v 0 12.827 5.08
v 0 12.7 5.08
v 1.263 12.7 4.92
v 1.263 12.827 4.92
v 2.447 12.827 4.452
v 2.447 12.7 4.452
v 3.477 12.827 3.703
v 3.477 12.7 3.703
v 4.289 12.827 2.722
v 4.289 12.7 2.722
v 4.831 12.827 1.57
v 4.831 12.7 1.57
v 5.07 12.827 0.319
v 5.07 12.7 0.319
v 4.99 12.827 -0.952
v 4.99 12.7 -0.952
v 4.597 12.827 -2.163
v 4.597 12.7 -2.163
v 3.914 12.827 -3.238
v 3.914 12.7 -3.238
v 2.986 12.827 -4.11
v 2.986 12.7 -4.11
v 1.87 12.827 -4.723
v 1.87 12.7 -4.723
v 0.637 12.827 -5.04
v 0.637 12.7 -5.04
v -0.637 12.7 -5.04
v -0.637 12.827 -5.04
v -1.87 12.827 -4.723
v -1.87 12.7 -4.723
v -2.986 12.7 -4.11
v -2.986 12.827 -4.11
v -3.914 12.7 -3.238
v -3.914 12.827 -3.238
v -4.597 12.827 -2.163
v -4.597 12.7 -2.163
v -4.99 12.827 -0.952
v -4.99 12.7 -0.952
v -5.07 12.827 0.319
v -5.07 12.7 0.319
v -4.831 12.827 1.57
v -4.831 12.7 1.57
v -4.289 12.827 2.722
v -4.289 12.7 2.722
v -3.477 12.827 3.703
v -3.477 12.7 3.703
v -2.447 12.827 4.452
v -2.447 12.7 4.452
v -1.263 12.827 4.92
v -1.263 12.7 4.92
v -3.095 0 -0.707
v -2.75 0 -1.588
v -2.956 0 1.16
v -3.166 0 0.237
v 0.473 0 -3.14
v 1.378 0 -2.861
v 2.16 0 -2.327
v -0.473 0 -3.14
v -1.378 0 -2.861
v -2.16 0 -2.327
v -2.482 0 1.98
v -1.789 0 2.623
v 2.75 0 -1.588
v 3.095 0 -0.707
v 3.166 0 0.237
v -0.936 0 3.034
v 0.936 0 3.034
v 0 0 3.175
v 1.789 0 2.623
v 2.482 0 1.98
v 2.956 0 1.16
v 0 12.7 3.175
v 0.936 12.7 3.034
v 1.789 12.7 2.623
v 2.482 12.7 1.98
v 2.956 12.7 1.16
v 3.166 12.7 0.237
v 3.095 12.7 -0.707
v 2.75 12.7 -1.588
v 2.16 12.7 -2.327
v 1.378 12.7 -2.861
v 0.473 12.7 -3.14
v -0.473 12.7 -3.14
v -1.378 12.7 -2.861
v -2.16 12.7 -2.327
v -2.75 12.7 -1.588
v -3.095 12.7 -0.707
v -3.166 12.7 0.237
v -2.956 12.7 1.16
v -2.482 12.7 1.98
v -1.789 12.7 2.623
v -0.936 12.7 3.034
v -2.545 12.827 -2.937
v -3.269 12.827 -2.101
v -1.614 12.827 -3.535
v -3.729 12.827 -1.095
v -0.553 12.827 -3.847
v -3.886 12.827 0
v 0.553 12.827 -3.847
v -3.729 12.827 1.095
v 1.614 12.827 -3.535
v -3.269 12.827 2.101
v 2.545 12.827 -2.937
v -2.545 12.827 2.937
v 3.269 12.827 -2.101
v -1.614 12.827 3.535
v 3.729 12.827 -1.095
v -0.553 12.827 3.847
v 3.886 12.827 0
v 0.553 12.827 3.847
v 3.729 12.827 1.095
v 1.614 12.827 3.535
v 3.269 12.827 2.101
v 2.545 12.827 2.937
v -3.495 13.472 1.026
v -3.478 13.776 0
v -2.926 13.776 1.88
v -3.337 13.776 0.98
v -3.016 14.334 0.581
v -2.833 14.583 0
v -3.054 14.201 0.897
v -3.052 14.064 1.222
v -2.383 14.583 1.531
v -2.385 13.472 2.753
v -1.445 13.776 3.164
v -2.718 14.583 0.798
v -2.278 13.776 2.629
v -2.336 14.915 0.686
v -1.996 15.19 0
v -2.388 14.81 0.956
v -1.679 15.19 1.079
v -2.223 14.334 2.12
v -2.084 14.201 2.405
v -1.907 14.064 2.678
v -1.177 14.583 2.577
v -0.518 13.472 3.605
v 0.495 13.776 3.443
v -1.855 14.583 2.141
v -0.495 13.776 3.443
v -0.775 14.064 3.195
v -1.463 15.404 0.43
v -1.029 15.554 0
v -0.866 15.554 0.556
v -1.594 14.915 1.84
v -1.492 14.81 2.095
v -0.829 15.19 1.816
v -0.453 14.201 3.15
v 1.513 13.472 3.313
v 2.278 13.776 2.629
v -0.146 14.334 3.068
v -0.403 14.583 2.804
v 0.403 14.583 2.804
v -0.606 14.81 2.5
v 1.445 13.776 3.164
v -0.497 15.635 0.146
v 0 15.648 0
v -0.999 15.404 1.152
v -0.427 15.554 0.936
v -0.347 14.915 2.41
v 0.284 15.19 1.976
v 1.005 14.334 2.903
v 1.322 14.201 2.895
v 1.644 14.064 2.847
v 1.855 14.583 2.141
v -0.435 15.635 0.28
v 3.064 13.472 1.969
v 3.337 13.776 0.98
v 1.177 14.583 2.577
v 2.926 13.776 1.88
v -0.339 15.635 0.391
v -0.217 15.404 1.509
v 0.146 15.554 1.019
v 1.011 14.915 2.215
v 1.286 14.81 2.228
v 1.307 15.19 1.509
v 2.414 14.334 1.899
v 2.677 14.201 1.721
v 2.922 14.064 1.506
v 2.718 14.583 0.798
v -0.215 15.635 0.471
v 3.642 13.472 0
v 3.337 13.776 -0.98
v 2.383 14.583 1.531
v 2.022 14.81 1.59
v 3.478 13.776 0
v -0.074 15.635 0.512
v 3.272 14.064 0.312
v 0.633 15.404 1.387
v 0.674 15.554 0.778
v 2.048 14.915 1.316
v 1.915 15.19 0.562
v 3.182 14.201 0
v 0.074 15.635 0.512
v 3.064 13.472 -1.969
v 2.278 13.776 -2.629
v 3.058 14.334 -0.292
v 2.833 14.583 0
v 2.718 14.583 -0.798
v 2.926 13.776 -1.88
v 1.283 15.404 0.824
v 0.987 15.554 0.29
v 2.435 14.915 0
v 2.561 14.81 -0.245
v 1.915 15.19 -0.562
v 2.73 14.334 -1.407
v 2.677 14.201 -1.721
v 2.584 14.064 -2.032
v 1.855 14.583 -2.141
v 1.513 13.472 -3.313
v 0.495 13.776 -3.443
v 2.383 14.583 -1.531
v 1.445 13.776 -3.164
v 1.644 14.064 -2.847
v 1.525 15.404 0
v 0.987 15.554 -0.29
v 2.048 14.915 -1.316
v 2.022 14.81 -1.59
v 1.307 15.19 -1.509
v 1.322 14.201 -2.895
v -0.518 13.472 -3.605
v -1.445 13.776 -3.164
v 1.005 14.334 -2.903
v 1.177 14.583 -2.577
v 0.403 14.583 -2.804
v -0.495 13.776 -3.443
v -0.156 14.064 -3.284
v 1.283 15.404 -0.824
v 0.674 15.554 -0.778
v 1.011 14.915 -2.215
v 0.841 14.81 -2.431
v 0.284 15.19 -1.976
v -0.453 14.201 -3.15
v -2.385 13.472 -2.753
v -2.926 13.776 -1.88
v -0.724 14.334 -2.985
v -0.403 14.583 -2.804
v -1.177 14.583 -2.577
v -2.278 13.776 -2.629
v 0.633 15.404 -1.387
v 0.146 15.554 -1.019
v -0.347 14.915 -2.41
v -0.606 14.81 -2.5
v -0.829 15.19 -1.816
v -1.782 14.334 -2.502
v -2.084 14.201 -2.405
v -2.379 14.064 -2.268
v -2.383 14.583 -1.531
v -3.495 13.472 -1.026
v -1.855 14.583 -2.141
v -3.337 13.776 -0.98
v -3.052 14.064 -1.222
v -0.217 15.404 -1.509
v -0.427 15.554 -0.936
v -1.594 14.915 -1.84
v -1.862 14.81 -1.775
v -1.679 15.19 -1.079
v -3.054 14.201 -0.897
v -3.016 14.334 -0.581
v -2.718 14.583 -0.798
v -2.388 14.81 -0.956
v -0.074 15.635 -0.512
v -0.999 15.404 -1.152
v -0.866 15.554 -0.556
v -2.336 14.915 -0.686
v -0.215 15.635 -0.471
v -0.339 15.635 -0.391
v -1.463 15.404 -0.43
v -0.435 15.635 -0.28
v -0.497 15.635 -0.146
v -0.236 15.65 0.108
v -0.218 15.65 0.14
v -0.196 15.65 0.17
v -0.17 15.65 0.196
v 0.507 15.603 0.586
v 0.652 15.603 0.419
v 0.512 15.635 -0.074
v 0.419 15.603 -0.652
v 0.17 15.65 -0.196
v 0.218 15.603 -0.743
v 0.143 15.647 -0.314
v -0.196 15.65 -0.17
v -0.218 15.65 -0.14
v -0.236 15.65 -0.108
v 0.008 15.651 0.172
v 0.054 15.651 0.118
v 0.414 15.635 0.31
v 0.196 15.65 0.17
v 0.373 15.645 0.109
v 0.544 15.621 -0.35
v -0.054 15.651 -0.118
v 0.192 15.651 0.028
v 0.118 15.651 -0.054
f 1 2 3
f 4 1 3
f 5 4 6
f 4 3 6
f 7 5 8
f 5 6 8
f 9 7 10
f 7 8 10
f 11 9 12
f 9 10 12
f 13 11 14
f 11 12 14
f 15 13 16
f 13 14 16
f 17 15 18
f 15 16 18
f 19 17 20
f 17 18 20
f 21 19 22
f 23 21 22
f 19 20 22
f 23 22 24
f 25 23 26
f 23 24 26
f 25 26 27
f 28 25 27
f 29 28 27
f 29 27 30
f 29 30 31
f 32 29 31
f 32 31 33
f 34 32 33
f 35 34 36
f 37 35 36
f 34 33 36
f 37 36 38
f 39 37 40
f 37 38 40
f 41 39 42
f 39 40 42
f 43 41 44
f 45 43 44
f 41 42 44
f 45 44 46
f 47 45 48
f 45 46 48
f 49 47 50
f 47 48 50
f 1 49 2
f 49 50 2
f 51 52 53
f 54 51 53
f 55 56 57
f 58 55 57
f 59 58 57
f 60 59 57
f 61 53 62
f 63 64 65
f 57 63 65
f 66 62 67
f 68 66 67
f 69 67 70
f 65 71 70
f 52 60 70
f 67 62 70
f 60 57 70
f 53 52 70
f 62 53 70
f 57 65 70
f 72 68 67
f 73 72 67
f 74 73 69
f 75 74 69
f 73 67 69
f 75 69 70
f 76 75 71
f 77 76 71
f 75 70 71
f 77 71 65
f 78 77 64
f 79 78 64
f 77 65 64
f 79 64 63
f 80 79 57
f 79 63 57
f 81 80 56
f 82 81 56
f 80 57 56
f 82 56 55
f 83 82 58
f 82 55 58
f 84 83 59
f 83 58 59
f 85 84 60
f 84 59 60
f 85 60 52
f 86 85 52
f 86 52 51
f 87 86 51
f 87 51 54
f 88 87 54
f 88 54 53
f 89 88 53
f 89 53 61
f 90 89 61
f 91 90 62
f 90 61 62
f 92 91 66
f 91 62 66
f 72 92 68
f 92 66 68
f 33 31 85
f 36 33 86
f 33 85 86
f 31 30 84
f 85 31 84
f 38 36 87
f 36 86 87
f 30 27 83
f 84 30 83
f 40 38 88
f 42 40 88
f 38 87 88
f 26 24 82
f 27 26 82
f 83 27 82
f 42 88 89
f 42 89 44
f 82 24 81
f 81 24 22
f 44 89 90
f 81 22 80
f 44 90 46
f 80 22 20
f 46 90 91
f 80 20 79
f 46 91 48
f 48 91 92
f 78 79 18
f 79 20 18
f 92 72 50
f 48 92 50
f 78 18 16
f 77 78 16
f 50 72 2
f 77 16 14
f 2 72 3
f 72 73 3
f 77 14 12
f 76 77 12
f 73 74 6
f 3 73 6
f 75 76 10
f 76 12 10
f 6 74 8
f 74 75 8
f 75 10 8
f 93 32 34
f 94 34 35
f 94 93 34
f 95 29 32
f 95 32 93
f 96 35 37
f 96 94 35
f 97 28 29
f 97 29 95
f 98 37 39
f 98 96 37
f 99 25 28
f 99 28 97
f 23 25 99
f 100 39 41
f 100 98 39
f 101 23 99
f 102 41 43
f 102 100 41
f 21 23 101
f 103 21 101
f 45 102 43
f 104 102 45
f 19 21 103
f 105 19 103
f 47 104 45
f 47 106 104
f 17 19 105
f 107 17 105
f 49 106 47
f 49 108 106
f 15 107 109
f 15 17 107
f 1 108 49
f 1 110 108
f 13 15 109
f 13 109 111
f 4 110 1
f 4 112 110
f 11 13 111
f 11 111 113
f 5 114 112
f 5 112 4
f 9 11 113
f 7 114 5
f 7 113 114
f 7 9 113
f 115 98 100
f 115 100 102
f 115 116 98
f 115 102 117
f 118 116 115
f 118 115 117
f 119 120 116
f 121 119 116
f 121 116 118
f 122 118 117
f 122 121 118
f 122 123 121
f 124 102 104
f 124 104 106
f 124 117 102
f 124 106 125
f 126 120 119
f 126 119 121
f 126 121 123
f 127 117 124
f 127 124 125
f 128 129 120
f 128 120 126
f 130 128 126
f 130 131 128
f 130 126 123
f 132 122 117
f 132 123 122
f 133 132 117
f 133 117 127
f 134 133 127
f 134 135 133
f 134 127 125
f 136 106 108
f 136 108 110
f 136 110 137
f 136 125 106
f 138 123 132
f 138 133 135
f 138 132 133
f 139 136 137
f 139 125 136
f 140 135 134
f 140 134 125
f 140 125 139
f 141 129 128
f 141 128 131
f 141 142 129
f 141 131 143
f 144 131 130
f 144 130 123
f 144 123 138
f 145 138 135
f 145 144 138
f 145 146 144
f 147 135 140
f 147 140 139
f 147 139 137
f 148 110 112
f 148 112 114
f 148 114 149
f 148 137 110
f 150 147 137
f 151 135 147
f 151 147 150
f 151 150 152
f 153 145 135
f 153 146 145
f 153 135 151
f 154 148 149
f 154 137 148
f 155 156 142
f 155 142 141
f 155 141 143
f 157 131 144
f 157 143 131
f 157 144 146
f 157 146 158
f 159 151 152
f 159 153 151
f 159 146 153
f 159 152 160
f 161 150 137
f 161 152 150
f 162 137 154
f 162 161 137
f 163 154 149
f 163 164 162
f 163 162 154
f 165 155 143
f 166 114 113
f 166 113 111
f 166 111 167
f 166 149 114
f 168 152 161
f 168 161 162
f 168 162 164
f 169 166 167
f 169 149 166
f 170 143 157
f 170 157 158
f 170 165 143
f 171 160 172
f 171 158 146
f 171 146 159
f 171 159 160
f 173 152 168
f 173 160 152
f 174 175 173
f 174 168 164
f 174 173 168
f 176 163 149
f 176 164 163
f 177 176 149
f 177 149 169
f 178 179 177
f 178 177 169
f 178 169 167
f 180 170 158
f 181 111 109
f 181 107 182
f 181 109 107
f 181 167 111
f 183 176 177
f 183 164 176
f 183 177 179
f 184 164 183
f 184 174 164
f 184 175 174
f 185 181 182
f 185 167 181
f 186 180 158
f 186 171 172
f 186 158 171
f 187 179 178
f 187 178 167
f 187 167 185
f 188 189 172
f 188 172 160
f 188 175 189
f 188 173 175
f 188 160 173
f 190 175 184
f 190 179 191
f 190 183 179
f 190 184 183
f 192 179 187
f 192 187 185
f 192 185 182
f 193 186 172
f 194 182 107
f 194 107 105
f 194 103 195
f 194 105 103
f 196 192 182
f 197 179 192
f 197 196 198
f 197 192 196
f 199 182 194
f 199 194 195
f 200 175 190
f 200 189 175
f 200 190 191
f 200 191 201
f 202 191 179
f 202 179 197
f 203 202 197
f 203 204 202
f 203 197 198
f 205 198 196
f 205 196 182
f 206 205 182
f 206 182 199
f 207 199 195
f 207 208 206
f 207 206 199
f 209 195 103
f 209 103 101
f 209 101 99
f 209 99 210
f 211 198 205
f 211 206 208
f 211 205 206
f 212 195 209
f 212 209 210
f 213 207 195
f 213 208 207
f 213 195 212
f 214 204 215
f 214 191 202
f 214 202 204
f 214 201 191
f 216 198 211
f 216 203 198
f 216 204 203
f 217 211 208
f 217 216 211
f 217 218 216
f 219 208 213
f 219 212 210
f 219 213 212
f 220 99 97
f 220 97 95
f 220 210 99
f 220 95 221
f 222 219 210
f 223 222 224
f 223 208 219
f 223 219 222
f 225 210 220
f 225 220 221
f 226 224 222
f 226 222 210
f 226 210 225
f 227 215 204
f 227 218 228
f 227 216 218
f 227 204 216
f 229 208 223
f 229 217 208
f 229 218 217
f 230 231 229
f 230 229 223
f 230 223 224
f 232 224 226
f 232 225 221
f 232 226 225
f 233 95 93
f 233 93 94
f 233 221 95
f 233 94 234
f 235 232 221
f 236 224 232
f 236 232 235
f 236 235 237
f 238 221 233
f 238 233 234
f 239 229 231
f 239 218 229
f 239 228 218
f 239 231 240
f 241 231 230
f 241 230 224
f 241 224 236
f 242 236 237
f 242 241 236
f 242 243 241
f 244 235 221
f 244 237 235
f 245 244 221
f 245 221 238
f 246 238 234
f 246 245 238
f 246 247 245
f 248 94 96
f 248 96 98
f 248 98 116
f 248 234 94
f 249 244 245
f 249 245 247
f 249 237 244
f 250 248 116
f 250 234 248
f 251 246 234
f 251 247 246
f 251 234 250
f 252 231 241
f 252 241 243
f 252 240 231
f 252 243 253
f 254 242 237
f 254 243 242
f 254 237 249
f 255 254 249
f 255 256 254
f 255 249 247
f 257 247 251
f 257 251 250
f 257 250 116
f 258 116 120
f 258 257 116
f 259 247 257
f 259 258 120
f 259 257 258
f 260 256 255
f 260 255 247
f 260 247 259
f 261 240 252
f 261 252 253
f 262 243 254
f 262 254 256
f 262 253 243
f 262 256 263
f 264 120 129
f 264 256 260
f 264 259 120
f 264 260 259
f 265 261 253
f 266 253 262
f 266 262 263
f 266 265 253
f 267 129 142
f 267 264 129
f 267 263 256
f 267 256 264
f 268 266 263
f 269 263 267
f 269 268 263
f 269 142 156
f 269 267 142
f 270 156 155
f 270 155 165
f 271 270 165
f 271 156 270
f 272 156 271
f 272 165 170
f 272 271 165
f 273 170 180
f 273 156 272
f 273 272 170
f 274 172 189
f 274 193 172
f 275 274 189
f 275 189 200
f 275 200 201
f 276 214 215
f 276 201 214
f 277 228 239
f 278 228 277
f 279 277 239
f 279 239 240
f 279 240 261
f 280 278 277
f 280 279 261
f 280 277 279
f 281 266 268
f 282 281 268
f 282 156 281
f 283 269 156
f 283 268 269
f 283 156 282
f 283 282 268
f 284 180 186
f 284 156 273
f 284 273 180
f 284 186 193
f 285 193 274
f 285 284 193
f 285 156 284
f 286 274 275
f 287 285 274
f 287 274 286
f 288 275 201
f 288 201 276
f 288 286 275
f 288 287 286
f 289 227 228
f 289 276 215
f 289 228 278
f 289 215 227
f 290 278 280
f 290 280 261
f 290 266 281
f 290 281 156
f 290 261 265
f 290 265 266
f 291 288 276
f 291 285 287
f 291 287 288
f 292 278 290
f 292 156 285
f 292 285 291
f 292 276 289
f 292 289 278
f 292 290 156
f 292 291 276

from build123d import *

# Parameters (mm, degrees)
SKETCH1_R           = 3.175
BOSS_EXTRUDE1_DEPTH = 12.7
SKETCH2_R           = 5.08
BOSS_EXTRUDE2_DEPTH = 0.127


with BuildPart() as part:
    # Sketch1 → Boss-Extrude1 (new body)
    with BuildSketch(Plane(origin=(0, 0, 0), x_dir=(1, 0, 0), z_dir=(0, 1, 0))):
        with Locations(Location((0, 0, 0), (0, 0, 270))):
            Circle(SKETCH1_R)
    extrude(amount=BOSS_EXTRUDE1_DEPTH)

    # Sketch2 → Boss-Extrude2 (add)
    with BuildSketch(Plane(origin=(0, 12.7, 0), x_dir=(1, 0, 0), z_dir=(0, 1, 0))):
        with Locations(Location((0, 0, 0), (0, 0, 270))):
            Circle(SKETCH2_R)
    extrude(amount=BOSS_EXTRUDE2_DEPTH)

    # Sketch3 → Revolve1 (revolve)
    with BuildSketch(Plane.XY):
        with BuildLine():
            Line((0, 12.827), (-3.886329239, 12.827))
            ThreePointArc((-3.886329239, 12.827), (-2.434866775, 14.914777268), (0, 15.647567139))
            Line((0, 15.647567139), (0, 12.827))
        make_face()
    revolve(axis=Axis((0, 12.827, 0), (0, 1, 0)))


solid = part.part
